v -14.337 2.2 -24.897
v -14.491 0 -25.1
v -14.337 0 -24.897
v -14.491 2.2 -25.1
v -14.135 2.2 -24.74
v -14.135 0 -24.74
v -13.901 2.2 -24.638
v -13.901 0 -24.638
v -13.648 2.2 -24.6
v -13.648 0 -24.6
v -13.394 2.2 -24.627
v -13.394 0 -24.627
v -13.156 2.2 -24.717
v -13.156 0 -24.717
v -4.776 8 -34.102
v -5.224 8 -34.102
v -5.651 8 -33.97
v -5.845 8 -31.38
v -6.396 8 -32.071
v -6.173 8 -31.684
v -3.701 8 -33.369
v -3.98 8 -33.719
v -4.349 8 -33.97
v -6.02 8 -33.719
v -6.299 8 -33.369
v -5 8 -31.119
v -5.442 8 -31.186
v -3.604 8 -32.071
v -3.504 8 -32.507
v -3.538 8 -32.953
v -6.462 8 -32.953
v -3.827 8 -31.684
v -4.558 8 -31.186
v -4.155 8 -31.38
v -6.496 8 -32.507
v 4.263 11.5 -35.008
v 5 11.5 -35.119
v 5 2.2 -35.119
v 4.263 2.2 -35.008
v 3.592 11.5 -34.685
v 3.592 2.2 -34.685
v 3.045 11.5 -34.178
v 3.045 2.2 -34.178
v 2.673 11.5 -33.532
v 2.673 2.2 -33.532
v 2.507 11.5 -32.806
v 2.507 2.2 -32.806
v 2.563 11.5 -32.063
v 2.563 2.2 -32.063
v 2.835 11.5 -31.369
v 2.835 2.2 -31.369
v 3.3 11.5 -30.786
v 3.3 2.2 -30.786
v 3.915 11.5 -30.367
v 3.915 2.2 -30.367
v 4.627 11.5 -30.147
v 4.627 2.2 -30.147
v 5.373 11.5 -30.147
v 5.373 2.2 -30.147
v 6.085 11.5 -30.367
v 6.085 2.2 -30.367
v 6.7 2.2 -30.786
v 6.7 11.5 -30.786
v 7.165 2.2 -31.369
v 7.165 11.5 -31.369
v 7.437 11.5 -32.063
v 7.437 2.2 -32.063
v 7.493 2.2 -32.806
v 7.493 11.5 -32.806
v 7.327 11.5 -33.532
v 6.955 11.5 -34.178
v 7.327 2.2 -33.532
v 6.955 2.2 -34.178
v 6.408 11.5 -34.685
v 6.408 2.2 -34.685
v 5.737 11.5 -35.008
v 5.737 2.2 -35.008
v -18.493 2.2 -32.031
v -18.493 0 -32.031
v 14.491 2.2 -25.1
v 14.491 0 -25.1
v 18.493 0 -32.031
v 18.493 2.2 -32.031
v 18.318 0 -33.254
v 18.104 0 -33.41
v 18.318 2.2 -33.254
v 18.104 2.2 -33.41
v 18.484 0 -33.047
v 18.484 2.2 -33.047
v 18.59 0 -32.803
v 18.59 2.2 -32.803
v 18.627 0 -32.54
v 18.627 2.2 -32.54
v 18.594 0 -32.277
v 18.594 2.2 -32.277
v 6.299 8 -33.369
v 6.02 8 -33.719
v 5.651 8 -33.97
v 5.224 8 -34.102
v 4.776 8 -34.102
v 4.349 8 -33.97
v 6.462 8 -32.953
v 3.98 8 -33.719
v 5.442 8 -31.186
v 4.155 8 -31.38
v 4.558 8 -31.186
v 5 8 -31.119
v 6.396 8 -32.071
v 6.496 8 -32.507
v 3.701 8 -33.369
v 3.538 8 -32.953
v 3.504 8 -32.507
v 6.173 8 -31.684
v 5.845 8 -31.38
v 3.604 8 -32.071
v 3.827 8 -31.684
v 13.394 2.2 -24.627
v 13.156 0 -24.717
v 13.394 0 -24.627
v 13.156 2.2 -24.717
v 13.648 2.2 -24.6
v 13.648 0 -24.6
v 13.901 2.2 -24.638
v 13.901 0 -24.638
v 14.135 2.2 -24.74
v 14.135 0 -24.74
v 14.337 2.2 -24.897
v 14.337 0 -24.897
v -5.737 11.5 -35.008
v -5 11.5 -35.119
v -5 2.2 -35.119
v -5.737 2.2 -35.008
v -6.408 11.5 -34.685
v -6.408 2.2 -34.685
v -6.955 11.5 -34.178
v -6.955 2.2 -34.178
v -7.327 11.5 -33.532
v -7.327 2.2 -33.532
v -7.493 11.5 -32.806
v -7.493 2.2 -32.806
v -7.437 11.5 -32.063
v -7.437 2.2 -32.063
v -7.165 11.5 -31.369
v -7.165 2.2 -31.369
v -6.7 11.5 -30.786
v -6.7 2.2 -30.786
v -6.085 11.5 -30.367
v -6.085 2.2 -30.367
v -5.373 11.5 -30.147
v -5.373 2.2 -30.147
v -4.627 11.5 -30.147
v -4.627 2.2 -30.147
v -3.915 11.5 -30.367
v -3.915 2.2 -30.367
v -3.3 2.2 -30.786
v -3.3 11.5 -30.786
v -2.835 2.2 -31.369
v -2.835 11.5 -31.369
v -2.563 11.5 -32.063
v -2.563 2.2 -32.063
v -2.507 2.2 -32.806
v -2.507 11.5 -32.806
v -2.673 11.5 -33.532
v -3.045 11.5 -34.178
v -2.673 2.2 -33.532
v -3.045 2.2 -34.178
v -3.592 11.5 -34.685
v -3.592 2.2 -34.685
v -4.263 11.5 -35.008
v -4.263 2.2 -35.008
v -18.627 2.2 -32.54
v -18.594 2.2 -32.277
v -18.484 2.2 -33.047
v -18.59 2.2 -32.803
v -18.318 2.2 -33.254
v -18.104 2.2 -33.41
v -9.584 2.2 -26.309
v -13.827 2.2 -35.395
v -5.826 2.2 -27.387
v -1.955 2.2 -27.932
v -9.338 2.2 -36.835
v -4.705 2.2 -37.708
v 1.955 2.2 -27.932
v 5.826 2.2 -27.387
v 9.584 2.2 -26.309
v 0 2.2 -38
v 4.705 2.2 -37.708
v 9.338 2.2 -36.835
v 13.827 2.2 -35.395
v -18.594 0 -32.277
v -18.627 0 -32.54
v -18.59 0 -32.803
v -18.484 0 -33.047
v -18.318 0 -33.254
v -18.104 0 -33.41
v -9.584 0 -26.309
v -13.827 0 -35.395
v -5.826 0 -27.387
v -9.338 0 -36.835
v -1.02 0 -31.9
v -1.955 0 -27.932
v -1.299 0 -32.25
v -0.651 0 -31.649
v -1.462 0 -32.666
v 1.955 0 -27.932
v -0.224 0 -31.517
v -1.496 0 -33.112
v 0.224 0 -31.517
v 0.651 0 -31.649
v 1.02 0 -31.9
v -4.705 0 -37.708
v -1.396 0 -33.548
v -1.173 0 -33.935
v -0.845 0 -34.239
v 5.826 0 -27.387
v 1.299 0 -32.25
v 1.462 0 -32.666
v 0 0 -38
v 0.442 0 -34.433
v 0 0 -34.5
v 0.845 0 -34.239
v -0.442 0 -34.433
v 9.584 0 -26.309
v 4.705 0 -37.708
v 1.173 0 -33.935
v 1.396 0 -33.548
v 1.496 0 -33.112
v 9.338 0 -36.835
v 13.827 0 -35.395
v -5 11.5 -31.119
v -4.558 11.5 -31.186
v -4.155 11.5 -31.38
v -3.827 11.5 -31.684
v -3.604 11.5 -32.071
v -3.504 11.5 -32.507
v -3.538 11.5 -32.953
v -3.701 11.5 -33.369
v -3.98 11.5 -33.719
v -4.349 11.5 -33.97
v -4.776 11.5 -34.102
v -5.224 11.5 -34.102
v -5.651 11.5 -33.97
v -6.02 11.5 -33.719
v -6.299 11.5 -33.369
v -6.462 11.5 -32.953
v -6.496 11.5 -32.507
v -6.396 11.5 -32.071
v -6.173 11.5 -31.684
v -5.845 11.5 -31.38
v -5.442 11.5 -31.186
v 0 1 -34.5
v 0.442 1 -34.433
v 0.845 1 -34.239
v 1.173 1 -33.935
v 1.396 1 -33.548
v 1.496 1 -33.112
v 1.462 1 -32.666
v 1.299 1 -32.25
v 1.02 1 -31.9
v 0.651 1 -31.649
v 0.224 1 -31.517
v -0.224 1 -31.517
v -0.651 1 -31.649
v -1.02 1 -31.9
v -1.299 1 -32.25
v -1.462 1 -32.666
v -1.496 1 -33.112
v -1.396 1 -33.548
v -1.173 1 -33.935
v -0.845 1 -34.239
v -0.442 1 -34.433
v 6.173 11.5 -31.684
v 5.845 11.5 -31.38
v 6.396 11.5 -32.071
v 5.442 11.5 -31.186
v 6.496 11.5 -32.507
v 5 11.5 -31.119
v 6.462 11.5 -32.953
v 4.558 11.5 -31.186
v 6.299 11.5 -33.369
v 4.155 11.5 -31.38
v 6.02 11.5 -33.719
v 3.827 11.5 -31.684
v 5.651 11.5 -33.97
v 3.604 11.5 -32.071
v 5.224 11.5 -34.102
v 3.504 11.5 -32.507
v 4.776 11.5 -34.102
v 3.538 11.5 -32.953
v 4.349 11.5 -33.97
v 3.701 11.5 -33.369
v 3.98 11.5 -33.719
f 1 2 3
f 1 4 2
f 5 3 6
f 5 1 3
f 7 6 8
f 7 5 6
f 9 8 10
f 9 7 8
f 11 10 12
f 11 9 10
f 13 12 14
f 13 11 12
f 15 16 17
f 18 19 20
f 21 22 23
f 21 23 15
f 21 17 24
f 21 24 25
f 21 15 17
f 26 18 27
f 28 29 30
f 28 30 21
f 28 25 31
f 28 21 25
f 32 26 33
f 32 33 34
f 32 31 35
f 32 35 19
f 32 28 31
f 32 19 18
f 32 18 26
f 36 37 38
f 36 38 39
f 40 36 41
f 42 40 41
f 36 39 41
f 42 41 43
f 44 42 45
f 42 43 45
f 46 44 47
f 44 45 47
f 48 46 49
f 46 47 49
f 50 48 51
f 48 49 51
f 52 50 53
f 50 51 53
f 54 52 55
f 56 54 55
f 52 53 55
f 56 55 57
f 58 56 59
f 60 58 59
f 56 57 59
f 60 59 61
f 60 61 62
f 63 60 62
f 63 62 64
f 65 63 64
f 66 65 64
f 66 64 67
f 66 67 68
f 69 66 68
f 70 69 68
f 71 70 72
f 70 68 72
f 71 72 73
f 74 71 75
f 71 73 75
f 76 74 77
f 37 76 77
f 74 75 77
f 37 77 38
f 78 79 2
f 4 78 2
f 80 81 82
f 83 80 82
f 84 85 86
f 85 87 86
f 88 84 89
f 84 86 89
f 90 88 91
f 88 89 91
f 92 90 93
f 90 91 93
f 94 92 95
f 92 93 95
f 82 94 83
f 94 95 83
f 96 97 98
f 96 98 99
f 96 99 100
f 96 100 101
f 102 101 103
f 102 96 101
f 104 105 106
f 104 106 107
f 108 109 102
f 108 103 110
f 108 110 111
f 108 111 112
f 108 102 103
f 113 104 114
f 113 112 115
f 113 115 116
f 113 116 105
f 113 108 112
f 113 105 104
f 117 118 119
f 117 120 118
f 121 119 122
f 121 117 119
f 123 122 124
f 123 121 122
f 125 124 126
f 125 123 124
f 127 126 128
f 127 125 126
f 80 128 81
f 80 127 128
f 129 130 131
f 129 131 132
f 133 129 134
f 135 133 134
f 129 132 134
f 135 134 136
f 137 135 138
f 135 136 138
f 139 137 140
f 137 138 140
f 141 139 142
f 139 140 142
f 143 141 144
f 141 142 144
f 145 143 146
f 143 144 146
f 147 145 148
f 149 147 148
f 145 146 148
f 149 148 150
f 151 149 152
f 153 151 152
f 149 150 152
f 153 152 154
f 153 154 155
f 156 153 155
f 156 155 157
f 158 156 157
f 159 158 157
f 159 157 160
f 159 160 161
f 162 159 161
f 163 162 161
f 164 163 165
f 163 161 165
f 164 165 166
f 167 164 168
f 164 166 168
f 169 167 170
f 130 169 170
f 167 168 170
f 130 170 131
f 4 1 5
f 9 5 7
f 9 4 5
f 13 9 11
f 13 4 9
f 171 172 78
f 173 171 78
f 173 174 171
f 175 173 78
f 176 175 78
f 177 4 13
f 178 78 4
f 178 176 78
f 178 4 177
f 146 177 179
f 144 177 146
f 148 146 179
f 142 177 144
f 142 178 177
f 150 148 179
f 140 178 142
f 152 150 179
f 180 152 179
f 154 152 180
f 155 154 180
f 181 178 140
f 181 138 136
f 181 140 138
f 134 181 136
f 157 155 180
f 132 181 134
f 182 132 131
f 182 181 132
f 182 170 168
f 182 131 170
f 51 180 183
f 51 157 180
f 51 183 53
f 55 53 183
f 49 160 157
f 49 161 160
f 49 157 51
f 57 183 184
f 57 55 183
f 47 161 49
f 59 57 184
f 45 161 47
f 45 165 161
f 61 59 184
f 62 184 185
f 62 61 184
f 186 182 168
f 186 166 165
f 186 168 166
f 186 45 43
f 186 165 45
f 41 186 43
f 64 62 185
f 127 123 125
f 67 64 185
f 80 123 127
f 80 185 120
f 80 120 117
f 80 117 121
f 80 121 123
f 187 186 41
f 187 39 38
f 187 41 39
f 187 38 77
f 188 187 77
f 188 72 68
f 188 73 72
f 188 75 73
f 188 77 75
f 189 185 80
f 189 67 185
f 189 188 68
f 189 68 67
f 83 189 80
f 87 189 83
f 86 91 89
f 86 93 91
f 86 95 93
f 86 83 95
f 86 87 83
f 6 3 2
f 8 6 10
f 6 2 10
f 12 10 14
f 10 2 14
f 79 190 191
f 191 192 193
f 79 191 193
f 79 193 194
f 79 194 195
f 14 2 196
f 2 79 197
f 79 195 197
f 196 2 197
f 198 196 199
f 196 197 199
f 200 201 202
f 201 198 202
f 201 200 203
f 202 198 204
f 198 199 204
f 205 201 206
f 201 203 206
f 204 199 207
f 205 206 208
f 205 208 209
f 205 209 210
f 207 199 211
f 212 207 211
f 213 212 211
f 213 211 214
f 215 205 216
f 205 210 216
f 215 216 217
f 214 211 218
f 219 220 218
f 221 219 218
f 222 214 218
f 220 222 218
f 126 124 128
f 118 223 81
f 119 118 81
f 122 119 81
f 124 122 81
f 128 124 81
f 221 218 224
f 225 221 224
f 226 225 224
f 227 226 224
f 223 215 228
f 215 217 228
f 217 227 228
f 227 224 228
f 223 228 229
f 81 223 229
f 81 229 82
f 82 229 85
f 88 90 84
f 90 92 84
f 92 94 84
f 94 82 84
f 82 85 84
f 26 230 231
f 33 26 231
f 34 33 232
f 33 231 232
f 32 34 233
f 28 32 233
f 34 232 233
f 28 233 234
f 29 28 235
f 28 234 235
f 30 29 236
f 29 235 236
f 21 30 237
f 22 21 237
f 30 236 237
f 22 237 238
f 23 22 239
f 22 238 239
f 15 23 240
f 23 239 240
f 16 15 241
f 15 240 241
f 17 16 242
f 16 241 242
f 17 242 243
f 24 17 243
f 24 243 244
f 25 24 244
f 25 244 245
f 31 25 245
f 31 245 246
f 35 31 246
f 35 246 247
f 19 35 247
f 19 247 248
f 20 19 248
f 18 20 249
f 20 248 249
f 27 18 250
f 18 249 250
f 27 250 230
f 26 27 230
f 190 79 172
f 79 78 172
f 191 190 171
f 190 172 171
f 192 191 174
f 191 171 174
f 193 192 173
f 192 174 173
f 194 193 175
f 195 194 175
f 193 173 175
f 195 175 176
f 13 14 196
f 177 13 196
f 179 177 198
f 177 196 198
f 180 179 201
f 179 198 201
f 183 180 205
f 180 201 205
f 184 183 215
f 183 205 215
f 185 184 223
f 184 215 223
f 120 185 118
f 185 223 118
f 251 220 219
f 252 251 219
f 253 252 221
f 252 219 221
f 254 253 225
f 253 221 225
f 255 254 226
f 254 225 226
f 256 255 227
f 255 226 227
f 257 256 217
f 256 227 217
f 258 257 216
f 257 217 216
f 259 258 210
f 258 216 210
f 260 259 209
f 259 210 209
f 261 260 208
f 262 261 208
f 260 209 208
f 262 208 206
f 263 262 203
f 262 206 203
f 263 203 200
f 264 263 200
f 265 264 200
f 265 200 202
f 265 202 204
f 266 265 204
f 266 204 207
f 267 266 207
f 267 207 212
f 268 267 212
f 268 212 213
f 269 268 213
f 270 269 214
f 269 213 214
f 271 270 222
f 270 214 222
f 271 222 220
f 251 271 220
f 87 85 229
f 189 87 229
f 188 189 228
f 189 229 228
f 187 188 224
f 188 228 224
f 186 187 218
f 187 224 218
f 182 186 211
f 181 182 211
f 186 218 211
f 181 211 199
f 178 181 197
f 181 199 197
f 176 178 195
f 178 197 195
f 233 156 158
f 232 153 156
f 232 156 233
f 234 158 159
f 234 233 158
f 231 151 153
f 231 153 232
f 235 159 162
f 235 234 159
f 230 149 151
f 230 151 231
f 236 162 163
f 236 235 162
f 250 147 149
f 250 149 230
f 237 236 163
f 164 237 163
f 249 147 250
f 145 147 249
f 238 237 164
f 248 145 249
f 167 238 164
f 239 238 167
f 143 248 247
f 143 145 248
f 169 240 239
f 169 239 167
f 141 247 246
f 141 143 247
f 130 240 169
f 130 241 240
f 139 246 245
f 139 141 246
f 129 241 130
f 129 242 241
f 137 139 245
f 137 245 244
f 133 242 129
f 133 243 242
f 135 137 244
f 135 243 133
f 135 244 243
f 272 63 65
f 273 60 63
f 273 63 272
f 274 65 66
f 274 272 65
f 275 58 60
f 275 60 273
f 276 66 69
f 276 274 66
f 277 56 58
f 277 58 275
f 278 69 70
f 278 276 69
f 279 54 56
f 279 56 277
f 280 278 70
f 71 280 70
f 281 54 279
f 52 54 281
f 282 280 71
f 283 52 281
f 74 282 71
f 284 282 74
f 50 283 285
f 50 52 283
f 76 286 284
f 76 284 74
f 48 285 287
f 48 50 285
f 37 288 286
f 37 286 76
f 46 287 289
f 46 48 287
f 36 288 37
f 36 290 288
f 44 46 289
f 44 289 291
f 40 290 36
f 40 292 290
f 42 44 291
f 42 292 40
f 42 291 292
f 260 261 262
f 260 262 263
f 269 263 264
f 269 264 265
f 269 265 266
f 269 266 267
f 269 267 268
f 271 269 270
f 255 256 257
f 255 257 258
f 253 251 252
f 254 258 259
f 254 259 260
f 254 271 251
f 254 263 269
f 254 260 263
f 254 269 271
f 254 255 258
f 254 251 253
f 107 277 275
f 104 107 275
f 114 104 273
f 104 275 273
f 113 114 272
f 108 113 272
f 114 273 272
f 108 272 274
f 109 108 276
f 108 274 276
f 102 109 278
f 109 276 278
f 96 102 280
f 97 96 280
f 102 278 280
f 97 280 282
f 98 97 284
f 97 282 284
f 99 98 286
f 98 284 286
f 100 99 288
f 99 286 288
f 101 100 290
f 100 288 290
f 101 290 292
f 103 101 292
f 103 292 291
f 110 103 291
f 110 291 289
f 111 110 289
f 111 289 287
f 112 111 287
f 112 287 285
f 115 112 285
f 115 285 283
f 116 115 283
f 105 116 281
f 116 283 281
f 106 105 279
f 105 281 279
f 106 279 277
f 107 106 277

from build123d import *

# Parameters (mm, degrees)
BOSS_EXTRUDE1_DEPTH = 2.2
SKETCH2_R           = 2.5
BOSS_EXTRUDE2_DEPTH = 9.3
SKETCH5_R           = 1.5
CUT_EXTRUDE1_DEPTH  = 3.5
SKETCH6_R           = 1.5
CUT_EXTRUDE2_DEPTH  = 1
FILLET1_R           = 1


with BuildPart() as part:
    # Sketch1 → Boss-Extrude1 (new body)
    with BuildSketch(Plane(origin=(0, 0, 0), x_dir=(1, 0, 0), z_dir=(0, 1, 0))):
        with BuildLine():
            Line((-19, 32.908965344), (-14, 24.248711306))
            ThreePointArc((-14, 24.248711306), (0, 28), (14, 24.248711306))
            Line((14, 24.248711306), (19, 32.908965344))
            ThreePointArc((19, 32.908965344), (0, 38), (-19, 32.908965344))
        make_face()
    extrude(amount=BOSS_EXTRUDE1_DEPTH)

    # Sketch2 → Boss-Extrude2 (add)
    with BuildSketch(Plane(origin=(0, 2.2, 0), x_dir=(1, 0, 0), z_dir=(0, 1, 0))):
        with Locations(Location((-5, 32.619012861, 0), (0, 0, 90))):
            Circle(SKETCH2_R)
        with Locations(Location((5, 32.619012861, 0), (0, 0, 90))):
            Circle(SKETCH2_R)
    extrude(amount=BOSS_EXTRUDE2_DEPTH)

    # Sketch5 → Cut-Extrude1 (cut)
    with BuildSketch(Plane(origin=(0, 11.5, 0), x_dir=(1, 0, 0), z_dir=(0, 1, 0))):
        with Locations(Location((-5, 32.619012861, 0), (0, 0, 270))):
            Circle(SKETCH5_R)
        with Locations(Location((5, 32.619012861, 0), (0, 0, 270))):
            Circle(SKETCH5_R)
    extrude(amount=-CUT_EXTRUDE1_DEPTH, mode=Mode.SUBTRACT)

    # Sketch6 → Cut-Extrude2 (cut)
    with BuildSketch(Plane.XZ):
        with Locations(Location((0, -33, 0), (0, 0, 270))):
            Circle(SKETCH6_R)
    extrude(amount=-CUT_EXTRUDE2_DEPTH, mode=Mode.SUBTRACT)

    # Fillet1
    fillet1_edges = [part.edges().sort_by_distance(p)[0] for p in [
        (19, 1.1, -32.908965344),
        (14, 1.1, -24.248711306),
        (-14, 1.1, -24.248711306),
        (-19, 1.1, -32.908965344),
    ]]
    fillet(fillet1_edges, radius=FILLET1_R)


solid = part.part
